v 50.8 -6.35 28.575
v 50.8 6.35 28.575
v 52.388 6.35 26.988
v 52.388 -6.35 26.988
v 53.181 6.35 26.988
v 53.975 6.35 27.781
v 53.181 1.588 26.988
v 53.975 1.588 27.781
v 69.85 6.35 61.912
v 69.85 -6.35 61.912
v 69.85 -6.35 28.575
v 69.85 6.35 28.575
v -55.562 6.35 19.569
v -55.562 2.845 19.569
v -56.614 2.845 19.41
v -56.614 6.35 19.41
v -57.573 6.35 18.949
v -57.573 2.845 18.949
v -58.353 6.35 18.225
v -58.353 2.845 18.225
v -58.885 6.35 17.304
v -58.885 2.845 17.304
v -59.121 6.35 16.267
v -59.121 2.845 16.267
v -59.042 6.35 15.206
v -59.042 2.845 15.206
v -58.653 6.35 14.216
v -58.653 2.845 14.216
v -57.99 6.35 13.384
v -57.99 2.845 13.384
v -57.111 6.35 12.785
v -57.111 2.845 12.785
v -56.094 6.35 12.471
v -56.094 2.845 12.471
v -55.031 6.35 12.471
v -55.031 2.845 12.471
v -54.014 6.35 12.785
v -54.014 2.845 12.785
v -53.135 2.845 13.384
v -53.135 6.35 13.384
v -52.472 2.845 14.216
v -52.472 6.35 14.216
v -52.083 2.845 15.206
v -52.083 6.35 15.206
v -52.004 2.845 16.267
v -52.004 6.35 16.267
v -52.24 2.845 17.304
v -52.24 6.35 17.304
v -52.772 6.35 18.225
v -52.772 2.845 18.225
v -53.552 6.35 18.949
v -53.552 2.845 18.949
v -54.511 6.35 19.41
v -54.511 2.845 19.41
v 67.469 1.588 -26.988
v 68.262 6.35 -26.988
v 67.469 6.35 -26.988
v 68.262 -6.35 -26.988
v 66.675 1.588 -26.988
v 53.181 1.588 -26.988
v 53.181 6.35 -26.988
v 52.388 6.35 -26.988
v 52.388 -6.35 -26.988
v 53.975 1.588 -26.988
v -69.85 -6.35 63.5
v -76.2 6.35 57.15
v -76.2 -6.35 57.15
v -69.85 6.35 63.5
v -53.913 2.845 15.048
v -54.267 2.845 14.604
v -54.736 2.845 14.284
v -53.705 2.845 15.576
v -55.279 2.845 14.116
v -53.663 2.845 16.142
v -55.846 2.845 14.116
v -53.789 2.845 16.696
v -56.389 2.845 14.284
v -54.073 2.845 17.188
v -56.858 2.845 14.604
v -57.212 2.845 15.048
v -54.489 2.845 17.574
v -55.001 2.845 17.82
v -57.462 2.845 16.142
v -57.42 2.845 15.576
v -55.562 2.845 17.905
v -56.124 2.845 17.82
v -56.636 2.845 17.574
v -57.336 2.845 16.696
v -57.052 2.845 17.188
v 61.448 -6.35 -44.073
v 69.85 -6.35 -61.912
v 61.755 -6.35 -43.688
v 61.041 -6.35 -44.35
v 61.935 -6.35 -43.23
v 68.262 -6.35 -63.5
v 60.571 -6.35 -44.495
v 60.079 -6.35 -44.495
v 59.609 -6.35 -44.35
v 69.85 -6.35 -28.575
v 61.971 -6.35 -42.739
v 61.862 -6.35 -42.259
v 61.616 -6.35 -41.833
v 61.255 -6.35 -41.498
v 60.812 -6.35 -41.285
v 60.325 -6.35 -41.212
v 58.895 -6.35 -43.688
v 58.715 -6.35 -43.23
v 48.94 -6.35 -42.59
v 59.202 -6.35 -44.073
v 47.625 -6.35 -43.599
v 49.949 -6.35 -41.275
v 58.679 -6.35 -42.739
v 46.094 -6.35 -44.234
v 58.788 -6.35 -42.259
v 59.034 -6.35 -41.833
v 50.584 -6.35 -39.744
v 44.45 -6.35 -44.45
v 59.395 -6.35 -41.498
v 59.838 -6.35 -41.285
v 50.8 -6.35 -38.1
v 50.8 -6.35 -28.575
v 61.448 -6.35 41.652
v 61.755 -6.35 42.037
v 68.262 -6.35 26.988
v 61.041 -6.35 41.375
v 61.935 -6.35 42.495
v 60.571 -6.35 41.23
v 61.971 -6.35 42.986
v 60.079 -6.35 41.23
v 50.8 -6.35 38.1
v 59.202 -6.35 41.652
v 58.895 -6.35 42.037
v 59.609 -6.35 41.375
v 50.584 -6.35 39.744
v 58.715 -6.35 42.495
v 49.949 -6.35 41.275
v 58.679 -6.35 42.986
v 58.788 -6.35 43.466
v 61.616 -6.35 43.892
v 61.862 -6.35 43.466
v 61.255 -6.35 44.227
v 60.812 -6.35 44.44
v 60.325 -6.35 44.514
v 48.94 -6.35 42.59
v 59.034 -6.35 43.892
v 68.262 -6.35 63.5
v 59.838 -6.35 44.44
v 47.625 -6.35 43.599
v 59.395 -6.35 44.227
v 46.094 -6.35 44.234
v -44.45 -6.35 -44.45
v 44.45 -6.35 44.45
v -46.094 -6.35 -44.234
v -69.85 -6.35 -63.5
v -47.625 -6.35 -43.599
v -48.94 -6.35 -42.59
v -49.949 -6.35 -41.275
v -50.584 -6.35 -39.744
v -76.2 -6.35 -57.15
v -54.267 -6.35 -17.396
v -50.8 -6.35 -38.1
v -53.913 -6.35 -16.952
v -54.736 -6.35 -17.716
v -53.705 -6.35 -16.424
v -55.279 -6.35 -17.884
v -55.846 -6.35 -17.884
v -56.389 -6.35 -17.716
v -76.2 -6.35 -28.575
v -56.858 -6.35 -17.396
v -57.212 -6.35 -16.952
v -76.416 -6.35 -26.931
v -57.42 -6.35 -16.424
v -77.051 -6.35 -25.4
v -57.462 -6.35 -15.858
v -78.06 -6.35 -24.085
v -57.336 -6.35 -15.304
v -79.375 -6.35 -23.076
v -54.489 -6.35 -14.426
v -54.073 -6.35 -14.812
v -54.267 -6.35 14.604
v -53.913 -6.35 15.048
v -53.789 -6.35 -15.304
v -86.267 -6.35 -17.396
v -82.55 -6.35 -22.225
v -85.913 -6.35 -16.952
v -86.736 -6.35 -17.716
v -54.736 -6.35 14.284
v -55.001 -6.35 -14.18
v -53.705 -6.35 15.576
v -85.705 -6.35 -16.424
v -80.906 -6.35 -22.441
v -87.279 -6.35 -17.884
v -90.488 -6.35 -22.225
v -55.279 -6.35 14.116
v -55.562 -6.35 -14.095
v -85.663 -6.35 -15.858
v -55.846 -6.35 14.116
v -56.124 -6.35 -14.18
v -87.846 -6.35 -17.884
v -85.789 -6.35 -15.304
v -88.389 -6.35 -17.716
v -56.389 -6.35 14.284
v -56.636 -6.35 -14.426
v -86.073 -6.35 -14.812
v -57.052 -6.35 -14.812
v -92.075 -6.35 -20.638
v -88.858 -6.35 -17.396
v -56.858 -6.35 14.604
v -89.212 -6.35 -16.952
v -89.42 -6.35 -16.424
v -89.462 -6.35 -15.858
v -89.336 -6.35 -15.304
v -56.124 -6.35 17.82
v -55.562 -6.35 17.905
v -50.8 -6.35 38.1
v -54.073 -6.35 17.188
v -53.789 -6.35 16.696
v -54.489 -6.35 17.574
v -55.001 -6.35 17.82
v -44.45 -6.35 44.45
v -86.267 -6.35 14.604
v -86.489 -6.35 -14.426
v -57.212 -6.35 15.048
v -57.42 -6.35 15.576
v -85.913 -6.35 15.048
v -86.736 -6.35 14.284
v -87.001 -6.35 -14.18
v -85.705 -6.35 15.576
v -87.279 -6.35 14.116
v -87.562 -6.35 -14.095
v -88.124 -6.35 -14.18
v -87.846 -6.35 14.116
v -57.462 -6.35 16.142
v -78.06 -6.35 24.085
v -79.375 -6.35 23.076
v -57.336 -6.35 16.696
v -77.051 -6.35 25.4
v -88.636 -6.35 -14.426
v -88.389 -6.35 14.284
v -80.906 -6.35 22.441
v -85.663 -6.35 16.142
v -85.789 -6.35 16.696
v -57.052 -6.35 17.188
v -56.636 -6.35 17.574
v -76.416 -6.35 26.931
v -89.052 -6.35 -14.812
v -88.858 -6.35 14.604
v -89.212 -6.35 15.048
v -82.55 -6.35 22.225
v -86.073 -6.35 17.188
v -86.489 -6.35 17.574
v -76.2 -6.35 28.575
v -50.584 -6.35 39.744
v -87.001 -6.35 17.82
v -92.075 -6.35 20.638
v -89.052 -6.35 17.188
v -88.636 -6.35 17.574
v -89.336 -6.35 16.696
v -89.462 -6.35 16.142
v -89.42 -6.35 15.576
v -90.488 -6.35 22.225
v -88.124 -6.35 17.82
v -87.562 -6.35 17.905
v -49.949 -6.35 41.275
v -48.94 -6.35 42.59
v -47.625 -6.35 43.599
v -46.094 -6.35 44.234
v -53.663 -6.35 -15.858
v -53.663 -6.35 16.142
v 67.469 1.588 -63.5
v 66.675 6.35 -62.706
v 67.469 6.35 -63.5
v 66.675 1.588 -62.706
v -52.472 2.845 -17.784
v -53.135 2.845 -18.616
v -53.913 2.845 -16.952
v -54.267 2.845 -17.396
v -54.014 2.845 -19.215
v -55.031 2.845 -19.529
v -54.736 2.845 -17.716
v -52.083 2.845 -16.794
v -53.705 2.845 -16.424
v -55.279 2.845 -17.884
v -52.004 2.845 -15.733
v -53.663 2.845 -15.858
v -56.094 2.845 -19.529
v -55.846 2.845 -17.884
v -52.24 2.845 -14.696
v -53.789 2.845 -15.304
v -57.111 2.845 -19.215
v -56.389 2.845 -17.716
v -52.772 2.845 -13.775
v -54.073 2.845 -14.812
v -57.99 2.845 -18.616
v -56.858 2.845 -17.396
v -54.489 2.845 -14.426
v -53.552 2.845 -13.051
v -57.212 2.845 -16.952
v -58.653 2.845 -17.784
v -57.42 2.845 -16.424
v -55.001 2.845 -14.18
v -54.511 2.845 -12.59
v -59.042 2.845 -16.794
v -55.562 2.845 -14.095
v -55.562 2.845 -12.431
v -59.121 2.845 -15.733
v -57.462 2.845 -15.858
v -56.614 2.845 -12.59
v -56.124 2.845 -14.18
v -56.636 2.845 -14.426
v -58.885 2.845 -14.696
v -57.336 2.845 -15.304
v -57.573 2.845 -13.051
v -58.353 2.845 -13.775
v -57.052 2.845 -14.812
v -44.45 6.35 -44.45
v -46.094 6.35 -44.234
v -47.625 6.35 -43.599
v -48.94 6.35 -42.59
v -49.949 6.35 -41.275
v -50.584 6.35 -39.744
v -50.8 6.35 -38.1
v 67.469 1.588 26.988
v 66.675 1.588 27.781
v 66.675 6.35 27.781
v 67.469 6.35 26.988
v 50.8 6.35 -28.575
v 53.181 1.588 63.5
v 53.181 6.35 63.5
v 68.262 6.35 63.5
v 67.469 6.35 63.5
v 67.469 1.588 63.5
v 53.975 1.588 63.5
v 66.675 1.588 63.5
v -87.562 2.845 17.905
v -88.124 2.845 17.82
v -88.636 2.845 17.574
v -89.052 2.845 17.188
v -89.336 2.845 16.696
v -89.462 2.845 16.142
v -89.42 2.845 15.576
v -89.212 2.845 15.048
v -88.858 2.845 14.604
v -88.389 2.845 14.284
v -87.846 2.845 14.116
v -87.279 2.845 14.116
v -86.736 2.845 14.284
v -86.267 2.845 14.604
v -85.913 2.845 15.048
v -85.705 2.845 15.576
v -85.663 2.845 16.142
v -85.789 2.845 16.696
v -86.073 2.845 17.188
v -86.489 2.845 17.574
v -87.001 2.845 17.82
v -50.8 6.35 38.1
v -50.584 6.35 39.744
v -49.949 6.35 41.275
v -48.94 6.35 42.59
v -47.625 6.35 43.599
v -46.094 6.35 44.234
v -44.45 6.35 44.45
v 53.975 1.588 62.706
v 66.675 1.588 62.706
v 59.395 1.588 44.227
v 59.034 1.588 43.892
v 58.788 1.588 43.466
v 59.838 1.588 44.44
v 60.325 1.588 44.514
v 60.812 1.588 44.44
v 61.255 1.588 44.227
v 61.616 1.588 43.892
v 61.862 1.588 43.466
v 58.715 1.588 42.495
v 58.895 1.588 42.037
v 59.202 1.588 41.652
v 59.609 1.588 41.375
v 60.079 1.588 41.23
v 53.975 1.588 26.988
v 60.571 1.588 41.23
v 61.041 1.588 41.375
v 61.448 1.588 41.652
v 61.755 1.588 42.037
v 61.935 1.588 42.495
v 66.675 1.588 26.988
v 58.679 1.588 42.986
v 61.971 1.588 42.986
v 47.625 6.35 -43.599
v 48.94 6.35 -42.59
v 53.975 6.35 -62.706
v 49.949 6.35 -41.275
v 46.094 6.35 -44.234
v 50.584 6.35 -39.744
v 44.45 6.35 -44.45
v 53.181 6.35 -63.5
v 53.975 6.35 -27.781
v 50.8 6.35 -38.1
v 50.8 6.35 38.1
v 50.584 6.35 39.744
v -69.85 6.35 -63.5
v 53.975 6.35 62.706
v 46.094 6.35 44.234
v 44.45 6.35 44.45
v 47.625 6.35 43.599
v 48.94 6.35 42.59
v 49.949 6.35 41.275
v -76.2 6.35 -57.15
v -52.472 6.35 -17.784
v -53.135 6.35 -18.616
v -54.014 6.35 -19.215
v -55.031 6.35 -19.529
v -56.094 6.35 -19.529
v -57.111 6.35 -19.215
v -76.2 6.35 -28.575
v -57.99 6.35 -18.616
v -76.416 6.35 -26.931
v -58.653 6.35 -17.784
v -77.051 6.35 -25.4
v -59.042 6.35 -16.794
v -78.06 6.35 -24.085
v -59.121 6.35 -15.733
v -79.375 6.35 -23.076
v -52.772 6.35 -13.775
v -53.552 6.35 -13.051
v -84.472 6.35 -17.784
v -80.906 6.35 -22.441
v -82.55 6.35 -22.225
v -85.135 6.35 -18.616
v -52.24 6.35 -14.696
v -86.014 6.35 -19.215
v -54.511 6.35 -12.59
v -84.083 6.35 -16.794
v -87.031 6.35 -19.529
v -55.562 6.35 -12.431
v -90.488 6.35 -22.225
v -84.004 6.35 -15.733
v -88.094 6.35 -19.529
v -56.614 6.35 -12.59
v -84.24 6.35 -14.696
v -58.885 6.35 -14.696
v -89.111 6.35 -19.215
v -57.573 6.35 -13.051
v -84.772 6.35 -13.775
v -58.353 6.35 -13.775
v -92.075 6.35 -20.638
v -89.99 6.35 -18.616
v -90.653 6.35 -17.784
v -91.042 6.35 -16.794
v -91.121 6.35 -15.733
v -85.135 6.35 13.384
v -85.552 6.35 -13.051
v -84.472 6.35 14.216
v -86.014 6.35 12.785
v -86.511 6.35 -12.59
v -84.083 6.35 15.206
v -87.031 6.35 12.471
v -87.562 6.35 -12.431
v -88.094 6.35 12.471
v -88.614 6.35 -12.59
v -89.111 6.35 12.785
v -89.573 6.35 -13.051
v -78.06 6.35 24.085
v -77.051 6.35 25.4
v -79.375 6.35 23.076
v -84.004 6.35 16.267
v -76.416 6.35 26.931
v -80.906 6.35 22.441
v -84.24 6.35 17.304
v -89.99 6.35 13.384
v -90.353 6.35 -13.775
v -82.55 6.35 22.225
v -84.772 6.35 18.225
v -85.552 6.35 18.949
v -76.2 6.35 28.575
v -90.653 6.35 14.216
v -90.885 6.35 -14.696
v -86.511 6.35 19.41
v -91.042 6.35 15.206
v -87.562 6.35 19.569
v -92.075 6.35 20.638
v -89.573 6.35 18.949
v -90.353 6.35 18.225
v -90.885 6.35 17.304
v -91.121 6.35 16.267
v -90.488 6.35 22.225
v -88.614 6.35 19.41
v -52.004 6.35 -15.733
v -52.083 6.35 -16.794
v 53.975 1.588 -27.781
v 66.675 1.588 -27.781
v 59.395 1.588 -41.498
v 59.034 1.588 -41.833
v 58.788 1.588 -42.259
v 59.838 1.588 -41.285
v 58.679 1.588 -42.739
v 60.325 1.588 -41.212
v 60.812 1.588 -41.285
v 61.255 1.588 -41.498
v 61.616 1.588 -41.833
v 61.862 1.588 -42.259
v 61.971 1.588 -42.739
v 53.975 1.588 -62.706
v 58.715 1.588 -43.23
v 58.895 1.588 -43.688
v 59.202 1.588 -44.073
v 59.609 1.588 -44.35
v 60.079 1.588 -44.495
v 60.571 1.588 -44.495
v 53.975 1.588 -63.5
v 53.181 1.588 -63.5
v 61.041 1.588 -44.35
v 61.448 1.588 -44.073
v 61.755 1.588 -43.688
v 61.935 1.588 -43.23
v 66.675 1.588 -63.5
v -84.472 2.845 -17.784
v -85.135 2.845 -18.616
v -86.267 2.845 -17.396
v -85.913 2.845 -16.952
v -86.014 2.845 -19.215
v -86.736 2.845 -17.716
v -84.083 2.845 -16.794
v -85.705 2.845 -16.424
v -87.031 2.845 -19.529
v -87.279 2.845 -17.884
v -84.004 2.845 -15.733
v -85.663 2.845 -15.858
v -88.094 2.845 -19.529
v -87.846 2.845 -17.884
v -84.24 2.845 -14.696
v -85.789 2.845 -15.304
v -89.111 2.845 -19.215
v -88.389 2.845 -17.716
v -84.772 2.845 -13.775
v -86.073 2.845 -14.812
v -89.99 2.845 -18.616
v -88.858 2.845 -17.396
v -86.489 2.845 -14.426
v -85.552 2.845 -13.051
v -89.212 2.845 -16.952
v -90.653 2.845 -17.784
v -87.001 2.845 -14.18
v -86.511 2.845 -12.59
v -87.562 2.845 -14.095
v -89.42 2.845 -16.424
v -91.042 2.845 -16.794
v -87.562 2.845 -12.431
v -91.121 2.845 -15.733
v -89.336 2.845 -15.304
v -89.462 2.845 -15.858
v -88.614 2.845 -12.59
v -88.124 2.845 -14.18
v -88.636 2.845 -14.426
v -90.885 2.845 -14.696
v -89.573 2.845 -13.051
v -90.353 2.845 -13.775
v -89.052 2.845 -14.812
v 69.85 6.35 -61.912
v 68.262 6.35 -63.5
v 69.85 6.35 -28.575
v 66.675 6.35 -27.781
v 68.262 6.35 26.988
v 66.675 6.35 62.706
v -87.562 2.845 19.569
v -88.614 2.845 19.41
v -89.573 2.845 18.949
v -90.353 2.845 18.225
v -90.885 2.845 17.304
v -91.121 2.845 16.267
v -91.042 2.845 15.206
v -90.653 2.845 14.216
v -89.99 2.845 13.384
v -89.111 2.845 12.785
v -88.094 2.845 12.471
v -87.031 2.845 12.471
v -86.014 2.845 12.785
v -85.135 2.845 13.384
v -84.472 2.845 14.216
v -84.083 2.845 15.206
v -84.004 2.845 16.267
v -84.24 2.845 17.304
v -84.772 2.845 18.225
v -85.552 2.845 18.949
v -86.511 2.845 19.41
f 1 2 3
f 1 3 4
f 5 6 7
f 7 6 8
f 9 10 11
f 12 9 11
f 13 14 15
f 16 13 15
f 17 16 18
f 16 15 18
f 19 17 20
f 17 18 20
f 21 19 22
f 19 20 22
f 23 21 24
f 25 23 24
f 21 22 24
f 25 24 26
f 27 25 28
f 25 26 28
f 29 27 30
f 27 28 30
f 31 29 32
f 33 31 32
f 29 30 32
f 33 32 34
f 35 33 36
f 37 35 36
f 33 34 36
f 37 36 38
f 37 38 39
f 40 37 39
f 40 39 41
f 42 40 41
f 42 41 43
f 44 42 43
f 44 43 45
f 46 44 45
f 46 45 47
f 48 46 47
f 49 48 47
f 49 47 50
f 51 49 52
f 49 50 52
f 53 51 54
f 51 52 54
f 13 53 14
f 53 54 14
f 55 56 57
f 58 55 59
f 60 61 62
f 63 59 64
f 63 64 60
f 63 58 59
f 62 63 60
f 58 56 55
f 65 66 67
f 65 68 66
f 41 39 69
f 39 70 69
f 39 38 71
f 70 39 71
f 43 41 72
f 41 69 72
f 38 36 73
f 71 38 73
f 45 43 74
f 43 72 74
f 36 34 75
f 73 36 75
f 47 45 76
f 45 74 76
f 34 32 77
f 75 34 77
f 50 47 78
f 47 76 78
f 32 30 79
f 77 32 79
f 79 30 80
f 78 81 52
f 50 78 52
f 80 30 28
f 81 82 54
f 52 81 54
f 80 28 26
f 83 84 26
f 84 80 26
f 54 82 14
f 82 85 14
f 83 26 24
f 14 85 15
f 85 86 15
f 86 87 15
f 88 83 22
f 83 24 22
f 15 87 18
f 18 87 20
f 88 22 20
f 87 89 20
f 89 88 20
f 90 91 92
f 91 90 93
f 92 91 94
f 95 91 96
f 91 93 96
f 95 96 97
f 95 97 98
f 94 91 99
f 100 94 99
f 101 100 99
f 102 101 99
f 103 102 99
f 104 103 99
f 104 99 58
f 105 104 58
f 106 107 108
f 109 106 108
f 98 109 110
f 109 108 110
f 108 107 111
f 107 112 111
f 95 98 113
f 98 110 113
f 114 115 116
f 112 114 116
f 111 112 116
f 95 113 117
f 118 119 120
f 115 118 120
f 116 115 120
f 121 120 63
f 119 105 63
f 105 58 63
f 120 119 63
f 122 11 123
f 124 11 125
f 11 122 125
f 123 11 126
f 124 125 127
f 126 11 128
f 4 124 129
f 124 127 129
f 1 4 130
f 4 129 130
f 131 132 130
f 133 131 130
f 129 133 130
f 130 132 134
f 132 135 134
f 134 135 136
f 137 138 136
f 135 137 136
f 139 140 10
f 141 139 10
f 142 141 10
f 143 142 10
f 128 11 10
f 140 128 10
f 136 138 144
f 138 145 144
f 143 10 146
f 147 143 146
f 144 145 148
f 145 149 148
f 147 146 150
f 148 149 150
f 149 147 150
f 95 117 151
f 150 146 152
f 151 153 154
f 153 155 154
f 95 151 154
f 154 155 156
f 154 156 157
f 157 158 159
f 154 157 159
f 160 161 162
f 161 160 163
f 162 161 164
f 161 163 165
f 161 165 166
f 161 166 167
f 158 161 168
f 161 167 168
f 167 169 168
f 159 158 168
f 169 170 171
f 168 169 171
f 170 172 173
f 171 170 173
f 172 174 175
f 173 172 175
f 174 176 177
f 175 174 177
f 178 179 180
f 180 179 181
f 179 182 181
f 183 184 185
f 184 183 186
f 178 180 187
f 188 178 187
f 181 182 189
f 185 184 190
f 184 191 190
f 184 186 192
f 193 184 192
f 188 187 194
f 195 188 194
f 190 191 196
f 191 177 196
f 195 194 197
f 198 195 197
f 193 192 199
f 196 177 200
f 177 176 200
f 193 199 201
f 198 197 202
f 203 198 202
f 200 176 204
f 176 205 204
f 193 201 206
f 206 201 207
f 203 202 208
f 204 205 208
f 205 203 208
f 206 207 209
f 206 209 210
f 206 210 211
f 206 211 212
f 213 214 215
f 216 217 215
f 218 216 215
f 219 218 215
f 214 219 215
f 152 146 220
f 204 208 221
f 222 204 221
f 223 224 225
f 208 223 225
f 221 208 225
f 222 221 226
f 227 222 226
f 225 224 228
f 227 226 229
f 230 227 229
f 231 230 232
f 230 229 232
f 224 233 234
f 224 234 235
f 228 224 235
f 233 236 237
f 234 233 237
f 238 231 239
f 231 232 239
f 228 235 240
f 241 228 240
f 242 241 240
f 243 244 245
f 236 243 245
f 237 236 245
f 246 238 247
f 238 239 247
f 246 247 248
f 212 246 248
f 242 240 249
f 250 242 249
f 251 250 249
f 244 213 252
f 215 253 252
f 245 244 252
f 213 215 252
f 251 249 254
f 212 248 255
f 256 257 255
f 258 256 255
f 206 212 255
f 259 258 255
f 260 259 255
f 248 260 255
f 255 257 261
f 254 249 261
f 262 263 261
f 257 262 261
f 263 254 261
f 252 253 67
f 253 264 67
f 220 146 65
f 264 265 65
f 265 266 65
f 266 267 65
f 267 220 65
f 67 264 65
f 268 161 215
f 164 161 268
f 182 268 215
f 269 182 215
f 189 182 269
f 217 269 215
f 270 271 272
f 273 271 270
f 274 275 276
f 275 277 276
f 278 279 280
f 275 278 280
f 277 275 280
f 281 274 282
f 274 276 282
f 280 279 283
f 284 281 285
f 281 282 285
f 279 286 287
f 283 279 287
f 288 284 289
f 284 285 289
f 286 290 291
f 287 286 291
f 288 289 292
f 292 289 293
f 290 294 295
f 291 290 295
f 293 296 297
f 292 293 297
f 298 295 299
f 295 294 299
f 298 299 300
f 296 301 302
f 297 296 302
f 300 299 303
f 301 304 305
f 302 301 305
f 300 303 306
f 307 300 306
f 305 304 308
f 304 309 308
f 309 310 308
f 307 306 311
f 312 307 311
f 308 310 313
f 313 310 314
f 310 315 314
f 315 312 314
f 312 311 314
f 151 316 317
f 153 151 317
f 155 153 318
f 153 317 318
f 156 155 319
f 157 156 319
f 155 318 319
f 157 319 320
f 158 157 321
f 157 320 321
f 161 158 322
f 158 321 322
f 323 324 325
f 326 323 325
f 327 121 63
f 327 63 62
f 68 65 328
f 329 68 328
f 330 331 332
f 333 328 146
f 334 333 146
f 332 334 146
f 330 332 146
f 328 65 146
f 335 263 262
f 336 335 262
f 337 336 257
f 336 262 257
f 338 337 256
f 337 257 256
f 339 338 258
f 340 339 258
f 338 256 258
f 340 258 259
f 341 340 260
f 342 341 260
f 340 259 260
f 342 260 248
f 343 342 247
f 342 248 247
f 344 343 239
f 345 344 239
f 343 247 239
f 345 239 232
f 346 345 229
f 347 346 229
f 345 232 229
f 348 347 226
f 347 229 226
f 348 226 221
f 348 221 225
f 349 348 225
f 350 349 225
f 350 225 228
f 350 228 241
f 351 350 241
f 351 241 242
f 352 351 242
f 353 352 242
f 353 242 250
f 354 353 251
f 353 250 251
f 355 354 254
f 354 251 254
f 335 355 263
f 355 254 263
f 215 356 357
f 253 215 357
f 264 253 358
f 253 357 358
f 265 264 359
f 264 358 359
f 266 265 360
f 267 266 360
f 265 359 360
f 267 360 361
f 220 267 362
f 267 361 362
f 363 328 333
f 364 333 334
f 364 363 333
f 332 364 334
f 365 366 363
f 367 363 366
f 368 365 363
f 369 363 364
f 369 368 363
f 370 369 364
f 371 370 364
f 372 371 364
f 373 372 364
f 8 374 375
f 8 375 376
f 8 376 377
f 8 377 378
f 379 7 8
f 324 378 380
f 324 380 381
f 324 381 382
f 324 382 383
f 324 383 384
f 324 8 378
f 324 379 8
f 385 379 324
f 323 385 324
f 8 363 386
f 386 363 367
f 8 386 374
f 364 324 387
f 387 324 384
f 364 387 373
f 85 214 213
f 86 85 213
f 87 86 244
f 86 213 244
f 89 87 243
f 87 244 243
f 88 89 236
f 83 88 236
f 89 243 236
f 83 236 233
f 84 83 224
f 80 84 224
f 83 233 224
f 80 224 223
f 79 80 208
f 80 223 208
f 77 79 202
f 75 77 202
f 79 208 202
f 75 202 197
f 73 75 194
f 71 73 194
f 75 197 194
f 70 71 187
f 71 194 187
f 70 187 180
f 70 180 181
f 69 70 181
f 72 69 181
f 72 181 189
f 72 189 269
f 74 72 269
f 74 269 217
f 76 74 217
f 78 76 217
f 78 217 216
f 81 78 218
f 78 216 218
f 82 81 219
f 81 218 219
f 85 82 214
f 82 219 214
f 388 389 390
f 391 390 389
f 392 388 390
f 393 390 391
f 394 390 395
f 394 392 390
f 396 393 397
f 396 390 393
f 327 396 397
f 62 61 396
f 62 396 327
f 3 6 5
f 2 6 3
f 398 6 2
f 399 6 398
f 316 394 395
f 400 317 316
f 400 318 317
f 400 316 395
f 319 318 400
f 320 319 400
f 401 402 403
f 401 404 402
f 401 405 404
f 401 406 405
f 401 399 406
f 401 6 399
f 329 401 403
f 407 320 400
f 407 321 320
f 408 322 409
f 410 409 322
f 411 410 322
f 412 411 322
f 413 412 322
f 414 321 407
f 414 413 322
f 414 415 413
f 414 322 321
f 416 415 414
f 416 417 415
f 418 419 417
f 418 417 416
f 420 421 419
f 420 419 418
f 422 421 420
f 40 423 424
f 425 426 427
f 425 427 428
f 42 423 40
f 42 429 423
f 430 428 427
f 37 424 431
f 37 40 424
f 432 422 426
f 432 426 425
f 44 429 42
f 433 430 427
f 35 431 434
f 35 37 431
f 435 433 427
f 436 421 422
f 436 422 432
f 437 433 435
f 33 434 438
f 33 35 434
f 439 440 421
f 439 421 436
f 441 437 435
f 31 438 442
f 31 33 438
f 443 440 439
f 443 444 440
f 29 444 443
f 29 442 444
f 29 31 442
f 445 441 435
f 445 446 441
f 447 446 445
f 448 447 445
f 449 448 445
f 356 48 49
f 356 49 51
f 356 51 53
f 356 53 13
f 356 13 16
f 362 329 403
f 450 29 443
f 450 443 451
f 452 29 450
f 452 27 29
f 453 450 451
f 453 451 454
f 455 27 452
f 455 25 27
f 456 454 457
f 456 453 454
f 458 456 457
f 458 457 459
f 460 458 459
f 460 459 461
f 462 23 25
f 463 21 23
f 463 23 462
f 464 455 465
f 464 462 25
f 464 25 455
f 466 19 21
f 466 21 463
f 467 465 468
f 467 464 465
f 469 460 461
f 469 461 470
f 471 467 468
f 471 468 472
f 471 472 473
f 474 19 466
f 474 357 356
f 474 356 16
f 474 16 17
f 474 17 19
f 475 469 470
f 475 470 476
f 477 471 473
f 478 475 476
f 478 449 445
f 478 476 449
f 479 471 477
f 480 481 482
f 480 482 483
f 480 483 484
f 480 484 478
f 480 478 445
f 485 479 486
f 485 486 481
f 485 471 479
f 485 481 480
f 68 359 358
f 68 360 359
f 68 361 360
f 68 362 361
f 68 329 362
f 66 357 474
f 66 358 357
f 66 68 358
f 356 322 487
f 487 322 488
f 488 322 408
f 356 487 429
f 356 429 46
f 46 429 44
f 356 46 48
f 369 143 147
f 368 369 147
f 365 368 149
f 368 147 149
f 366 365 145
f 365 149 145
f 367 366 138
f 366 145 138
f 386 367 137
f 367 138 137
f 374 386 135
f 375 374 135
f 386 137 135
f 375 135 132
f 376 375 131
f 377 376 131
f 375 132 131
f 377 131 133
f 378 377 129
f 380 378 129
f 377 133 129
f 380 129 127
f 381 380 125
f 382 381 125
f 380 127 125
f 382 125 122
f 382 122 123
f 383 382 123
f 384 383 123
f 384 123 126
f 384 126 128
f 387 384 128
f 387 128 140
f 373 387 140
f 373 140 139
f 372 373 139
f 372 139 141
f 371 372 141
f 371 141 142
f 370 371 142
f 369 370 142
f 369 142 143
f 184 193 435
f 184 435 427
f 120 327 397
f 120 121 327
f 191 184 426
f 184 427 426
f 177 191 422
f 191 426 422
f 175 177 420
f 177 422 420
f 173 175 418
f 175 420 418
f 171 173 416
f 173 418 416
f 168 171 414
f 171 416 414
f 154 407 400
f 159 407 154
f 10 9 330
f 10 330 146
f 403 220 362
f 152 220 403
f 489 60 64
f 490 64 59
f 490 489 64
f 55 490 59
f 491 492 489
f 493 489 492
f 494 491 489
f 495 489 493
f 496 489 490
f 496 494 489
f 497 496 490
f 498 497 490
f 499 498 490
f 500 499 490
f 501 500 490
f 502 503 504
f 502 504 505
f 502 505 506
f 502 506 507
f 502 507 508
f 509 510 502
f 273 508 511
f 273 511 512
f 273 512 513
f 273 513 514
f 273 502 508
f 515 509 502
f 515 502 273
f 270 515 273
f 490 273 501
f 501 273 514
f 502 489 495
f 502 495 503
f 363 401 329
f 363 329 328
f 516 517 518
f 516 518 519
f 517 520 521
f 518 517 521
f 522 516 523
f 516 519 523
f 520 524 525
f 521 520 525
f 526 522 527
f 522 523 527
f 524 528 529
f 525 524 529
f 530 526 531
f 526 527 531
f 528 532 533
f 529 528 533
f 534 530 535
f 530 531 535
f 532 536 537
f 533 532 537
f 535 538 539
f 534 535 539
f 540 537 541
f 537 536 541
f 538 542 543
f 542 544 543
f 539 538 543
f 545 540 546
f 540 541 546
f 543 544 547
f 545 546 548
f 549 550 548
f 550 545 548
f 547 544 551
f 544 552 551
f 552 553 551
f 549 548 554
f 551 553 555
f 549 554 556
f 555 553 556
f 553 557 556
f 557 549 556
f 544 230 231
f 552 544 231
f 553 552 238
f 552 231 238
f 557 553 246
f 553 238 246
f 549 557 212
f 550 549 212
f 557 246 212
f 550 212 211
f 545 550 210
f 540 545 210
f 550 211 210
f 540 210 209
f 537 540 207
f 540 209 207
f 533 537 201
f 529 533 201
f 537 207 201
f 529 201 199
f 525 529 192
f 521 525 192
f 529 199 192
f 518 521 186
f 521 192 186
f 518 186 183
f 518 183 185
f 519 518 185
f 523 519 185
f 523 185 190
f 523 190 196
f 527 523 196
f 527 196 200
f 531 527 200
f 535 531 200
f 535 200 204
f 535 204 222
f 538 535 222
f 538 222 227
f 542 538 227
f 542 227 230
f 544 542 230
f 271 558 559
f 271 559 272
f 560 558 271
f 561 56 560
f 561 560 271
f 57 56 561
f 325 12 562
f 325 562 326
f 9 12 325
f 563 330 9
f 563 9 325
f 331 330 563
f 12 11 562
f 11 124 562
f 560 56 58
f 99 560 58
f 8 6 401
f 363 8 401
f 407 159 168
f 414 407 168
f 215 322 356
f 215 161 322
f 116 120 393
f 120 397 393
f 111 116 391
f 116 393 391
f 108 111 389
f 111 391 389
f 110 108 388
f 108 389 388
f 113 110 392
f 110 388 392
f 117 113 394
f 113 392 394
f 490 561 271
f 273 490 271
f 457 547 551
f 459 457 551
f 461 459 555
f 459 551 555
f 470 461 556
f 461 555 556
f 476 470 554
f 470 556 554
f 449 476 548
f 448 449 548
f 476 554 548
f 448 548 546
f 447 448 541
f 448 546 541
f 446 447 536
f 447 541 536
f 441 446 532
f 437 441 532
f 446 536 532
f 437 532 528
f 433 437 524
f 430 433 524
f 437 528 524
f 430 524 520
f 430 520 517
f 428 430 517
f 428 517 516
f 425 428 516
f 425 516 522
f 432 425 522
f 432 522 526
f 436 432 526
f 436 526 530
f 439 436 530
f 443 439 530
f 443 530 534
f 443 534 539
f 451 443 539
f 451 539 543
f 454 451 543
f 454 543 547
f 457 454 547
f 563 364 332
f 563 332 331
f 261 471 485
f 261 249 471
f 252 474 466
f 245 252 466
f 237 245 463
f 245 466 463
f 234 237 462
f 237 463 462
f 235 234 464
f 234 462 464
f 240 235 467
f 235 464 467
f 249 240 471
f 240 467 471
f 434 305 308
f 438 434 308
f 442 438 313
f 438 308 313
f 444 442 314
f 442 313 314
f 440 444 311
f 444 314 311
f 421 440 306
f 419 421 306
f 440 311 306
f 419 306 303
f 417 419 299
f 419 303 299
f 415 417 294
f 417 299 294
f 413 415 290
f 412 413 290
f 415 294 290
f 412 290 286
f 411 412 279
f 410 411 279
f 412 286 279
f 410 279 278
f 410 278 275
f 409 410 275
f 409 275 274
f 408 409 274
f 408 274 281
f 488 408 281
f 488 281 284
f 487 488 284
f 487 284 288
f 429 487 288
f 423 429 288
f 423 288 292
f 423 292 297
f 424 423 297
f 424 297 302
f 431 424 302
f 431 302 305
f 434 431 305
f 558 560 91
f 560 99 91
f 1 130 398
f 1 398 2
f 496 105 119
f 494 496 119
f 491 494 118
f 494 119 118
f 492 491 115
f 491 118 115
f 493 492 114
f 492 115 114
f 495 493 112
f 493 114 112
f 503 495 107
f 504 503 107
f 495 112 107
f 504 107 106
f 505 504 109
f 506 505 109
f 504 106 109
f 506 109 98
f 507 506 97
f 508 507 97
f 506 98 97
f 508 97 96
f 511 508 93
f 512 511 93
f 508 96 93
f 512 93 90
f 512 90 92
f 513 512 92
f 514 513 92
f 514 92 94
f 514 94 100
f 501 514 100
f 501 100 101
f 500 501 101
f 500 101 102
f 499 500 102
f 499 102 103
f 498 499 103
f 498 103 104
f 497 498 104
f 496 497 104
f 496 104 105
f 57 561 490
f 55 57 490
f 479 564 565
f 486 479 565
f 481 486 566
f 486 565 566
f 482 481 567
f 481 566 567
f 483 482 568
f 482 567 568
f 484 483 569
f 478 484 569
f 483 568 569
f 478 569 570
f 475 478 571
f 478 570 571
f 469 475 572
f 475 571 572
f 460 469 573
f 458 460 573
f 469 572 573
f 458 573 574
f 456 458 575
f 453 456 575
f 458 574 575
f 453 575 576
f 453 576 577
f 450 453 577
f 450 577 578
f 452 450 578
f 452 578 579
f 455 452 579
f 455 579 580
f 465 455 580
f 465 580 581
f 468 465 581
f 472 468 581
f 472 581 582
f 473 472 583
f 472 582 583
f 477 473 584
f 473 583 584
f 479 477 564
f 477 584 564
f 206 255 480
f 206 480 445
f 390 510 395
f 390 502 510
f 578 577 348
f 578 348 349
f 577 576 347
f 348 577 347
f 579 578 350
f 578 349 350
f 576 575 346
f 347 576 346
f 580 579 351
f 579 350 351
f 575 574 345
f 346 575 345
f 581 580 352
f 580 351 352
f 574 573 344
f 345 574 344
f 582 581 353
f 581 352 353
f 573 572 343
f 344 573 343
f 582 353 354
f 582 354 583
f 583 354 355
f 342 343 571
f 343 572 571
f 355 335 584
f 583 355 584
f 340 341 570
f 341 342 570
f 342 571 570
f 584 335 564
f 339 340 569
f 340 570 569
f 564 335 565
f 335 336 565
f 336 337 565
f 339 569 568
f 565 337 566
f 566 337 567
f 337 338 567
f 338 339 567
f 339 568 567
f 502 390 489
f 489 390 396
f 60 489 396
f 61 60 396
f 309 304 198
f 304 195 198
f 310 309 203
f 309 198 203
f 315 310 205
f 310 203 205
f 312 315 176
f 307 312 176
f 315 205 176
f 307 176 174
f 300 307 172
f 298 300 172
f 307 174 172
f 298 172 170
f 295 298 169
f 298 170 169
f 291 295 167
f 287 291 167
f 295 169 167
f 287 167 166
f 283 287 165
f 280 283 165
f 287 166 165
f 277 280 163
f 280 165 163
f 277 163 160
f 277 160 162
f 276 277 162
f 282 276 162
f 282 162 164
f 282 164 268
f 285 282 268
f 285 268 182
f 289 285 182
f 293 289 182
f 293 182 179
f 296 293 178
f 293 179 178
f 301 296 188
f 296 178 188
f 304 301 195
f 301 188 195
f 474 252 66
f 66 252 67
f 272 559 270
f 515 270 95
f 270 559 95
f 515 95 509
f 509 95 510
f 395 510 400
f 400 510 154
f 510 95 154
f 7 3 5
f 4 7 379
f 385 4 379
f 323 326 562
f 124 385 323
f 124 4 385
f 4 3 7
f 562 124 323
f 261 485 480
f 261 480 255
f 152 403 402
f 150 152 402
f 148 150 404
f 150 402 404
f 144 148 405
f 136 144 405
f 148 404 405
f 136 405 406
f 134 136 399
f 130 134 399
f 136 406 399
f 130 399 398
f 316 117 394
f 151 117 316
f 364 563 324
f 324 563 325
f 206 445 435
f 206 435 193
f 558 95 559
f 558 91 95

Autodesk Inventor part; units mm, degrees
ref_plane "YZ Plane" through (0, 0, 0) normal (1, 0, 0) x (0, 1, 0)
sketch "Sketch1" plane through (0, 0, 0) normal (0, 1, 0) x (-1, 0, 0)
  line L0 (0, -88.9) -> (0, 88.9) projected
  line L1 (-102.235, 0) -> (124.46, 0) projected
  line L2 (50.8, 44.45) -> (-50.8, 44.45)
  line L3 (-50.8, -44.45) -> (50.8, -44.45)
  line L4 (50.8, -44.45) -> (50.8, 44.45)
  line L5 (76.2, 63.5) -> (-69.85, 63.5)
  line L6 (-69.85, -63.5) -> (76.2, -63.5)
  line L7 (76.2, -63.5) -> (76.2, 63.5)
  line L8 (-50.8, 26.9875) -> (-69.85, 26.9875)
  line L9 (-69.85, -26.9875) -> (-50.8, -26.9875)
  line L10 (-50.8, 44.45) -> (-50.8, 26.9875)
  line L11 (-50.8, -26.9875) -> (-50.8, -44.45)
  line L12 (-69.85, 63.5) -> (-69.85, 26.9875)
  line L13 (-69.85, -26.9875) -> (-69.85, -63.5)
  line L14 (-53.975, 63.5) -> (-66.675, 63.5) construction
  line L15 (-66.675, 63.5) -> (-66.675, 26.9875) construction
  line L16 (-66.675, 26.9875) -> (-53.975, 26.9875) construction
  line L17 (-53.975, 26.9875) -> (-53.975, 63.5) construction
  line L18 (-53.975, -26.9875) -> (-66.675, -26.9875) construction
  line L19 (-66.675, -26.9875) -> (-66.675, -63.5) construction
  line L20 (-66.675, -63.5) -> (-53.975, -63.5) construction
  line L21 (-53.975, -63.5) -> (-53.975, -26.9875) construction
  line L22 (-60.325, 63.5) -> (-60.325, 26.9875) construction
  line L23 (-60.325, -26.9875) -> (-60.325, -63.5) construction
  line L24 (76.2, 22.225) -> (92.075, 22.225)
  line L25 (92.075, 22.225) -> (92.075, -22.225)
  line L26 (92.075, -22.225) -> (76.2, -22.225)
  line L27 (76.2, -22.225) -> (76.2, 22.225)
  point P0 (0, 0)
  dimension "d0" = 12.7
  dimension "d1" = 136.525
  dimension "d2" = 53.975
  dimension "d3" = 26.9875
  dimension "d4" = 101.6
  dimension "d5" = 19.05
  dimension "d6" = 3.175
  dimension "d7" = 50.8
  dimension "d8" = 88.9
  dimension "d9" = 44.45
  dimension "d10" = 19.05
  dimension "d11" = 19.05
  dimension "d24" = 25.4
  dimension "d25" = 44.45
  dimension "d26" = 22.225
  dimension "d27" = 41.275
extrude "Extrusion1" add sketch "Sketch1" along normal mid plane 12.7 contours L6 L13 L9 L11 L3 L0 | L0 L3 L4 L1 L7 L6 | L7 L1 L25 L26 | L2 L10 L8 L12 L5 L0 | L0 L5 L7 L1 L4 L2 | L7 L24 L25 L1
sketch "Sketch2" plane through (0, 6.35, 0) normal (0, 1, 0) x (1, 0, 0)
  line L0 (50.8, -44.45) -> (-50.8, -44.45) projected
  line L1 (-50.8, -44.45) -> (-50.8, 44.45) projected
  line L2 (-50.8, 44.45) -> (50.8, 44.45) projected
  line L3 (50.8, 44.45) -> (50.8, 26.9875) projected
  line L4 (50.8, 26.9875) -> (69.85, 26.9875) projected
  line L5 (69.85, 26.9875) -> (69.85, 63.5) projected
  line L6 (69.85, 63.5) -> (-76.2, 63.5) projected
  line L7 (-76.2, -22.225) -> (-76.2, -63.5) projected
  line L8 (-76.2, -63.5) -> (69.85, -63.5) projected
  line L9 (69.85, -63.5) -> (69.85, -26.9875) projected
  line L10 (69.85, -26.9875) -> (50.8, -26.9875) projected
  line L11 (50.8, -26.9875) -> (50.8, -44.45) projected
  line L12 (-76.2, -63.5) -> (69.85, -63.5) projected
  line L13 (53.975, -63.5) -> (66.675, -63.5)
  line L14 (66.675, -63.5) -> (66.675, -26.9875)
  line L15 (66.675, -26.9875) -> (53.975, -26.9875)
  line L16 (53.975, -26.9875) -> (53.975, -63.5)
  line L17 (50.8, 26.9875) -> (69.85, 26.9875) projected
  line L18 (69.85, 63.5) -> (-76.2, 63.5) projected
  line L19 (53.975, 26.9875) -> (66.675, 26.9875)
  line L20 (66.675, 26.9875) -> (66.675, 63.5)
  line L21 (66.675, 63.5) -> (53.975, 63.5)
  line L22 (53.975, 63.5) -> (53.975, 26.9875)
  line L23 (60.325, -63.5) -> (60.325, 99.2856) construction
  line L24 (102.235, 0) -> (-124.46, 0) projected
  line L25 (-76.2, 22.225) -> (-92.075, 22.225) projected
  line L26 (-92.075, 22.225) -> (-92.075, -22.225) projected
  line L27 (-92.075, -22.225) -> (-76.2, -22.225) projected
  line L28 (-76.2, 63.5) -> (-76.2, 22.225) projected
  point P0 (0, 0)
  dimension "d14" = 12.7
  dimension "d15" = 6.35
  dimension "d16" = 19.05
  dimension "d17" = 3.175
extrude "Extrusion2" cut sketch "Sketch2" against normal blind 4.7625 contours L10 L14 L8 L16 | L22 L6 L20 L4
sketch "Sketch3" plane through (0, 6.35, 0) normal (0, 1, 0) x (1, 0, 0)
  line L0 (-50.8, 12.4641) -> (-90.8, 12.4641) projected
  line L1 (102.235, 0) -> (-124.46, 0) projected
  line L2 (53.975, -63.5) -> (53.975, -26.9875) projected
  line L3 (53.975, -26.9875) -> (50.8, -26.9875) projected
  line L4 (50.8, -26.9875) -> (50.8, -44.45) projected
  line L5 (50.8, -44.45) -> (-50.8, -44.45) projected
  line L6 (-50.8, -44.45) -> (-50.8, 44.45) projected
  line L7 (-50.8, 44.45) -> (50.8, 44.45) projected
  line L8 (50.8, 44.45) -> (50.8, 26.9875) projected
  line L9 (50.8, 26.9875) -> (53.975, 26.9875) projected
  line L10 (53.975, 26.9875) -> (53.975, 63.5) projected
  line L11 (53.975, 63.5) -> (-76.2, 63.5) projected
  line L12 (-76.2, -22.225) -> (-76.2, -63.5) projected
  line L13 (-76.2, -63.5) -> (53.975, -63.5) projected
  line L14 (-76.2, 63.5) -> (-76.2, 22.225) projected
  line L15 (-76.2, 22.225) -> (-92.075, 22.225) projected
  line L16 (-92.075, 22.225) -> (-92.075, -22.225) projected
  line L17 (-92.075, -22.225) -> (-76.2, -22.225) projected
  point P0 (0, 0)
  point P1 (-87.5625, 16)
  point P2 (-55.5625, 16)
  point P3 (-55.5625, -16)
  point P4 (-87.5625, -16)
  dimension "d20" = 32
  dimension "d21" = 32
  dimension "d22" = 16
  dimension "d23" = 4.7625
hole "Hole1" at (-87.5625, 6.35, -16) at (-55.5625, 6.35, -16) at (-55.5625, 6.35, 16) at (-87.5625, 6.35, 16) direction (0, -1, 0) diameter 3.81 end through all counterbore diameter 7.1374 counterbore depth 3.5052 clearance for "Socket Head Cap Screw" size "#6" standard "Ansi Unified Screw Threads"
fillet "Fillet1" radius 6.35 6 edges at (-76.2, 0, 22.225) (-76.2, 0, -22.225) (-50.8, 0, -44.45) (-50.8, 0, 44.45) (50.8, 0, 44.45) (50.8, 0, -44.45)
chamfer "Chamfer1" distance 1.5875 angle 45 8 edges at (-92.075, 0, 22.225) (-92.075, 0, -22.225) (69.85, 0, 26.9875) (50.8, 0, 26.9875) (69.85, 0, 63.5) (69.85, 0, -26.9875) (69.85, 0, -63.5) (50.8, 0, -26.9875)
chamfer "Chamfer2" distance 6.35 angle 45 2 edges at (-76.2, 0, 63.5) (-76.2, 0, -63.5)
ref_plane "Work Plane1" through (60.325, 6.35, 63.5) normal (1, 0, 0) x (0, 0, -1)
ref_plane "Work Plane2" through (60.325, 6.35, -26.9875) normal (1, 0, 0) x (0, 0, -1)
sketch "Sketch4" plane through (0, 1.5875, 0) normal (0, 1, 0) x (1, 0, 0)
  line L0 (53.975, 63.5) -> (66.675, 63.5) projected
  line L1 (53.975, 26.9875) -> (53.975, 63.5) projected
  line L2 (66.675, 26.9875) -> (53.975, 26.9875) projected
  line L3 (66.675, 63.5) -> (66.675, 26.9875) projected
  line L4 (53.975, -26.9875) -> (66.675, -26.9875) projected
  line L5 (53.975, -63.5) -> (53.975, -26.9875) projected
  line L6 (66.675, -63.5) -> (53.975, -63.5) projected
  line L7 (66.675, -26.9875) -> (66.675, -63.5) projected
  point P0 (0, 0)
  point P1 (60.325, 42.8625)
  point P2 (60.325, -42.8625)
  dimension "d44" = 15.875
  dimension "d45" = 15.875
  dimension "d46" = 6.35
hole "Hole2" at (60.325, 1.5875, -42.8625) at (60.325, 1.5875, 42.8625) direction (0, -1, 0) diameter 3.302 end through all thread size "8-32 UNC" class "2B" standard "ANSI Unified Screw Threads"
chamfer "Chamfer3" distance 0.7937 angle 45 8 edges at (53.975, 3.9687, 63.5) (66.675, 3.9687, 63.5) (53.975, 3.9687, 26.9875) (66.675, 3.9687, 26.9875) (53.975, 3.9687, -26.9875) (66.675, 3.9687, -26.9875) (53.975, 3.9687, -63.5) (66.675, 3.9687, -63.5)
equation "\"d3\" = 0.5 * d2"
equation "\"d7\" = 0.5 * d4"
equation "\"d9\" = 0.5 * d8"
equation "\"d11\" = d10"
equation "\"d26\" = 0.5 * d25"
equation "\"d21\" = d20"
equation "\"d22\" = 0.5 * d21"
equation "\"d45\" = d44"
properties part number "Holder - headbars - L - LH" material "Stainless Steel"
